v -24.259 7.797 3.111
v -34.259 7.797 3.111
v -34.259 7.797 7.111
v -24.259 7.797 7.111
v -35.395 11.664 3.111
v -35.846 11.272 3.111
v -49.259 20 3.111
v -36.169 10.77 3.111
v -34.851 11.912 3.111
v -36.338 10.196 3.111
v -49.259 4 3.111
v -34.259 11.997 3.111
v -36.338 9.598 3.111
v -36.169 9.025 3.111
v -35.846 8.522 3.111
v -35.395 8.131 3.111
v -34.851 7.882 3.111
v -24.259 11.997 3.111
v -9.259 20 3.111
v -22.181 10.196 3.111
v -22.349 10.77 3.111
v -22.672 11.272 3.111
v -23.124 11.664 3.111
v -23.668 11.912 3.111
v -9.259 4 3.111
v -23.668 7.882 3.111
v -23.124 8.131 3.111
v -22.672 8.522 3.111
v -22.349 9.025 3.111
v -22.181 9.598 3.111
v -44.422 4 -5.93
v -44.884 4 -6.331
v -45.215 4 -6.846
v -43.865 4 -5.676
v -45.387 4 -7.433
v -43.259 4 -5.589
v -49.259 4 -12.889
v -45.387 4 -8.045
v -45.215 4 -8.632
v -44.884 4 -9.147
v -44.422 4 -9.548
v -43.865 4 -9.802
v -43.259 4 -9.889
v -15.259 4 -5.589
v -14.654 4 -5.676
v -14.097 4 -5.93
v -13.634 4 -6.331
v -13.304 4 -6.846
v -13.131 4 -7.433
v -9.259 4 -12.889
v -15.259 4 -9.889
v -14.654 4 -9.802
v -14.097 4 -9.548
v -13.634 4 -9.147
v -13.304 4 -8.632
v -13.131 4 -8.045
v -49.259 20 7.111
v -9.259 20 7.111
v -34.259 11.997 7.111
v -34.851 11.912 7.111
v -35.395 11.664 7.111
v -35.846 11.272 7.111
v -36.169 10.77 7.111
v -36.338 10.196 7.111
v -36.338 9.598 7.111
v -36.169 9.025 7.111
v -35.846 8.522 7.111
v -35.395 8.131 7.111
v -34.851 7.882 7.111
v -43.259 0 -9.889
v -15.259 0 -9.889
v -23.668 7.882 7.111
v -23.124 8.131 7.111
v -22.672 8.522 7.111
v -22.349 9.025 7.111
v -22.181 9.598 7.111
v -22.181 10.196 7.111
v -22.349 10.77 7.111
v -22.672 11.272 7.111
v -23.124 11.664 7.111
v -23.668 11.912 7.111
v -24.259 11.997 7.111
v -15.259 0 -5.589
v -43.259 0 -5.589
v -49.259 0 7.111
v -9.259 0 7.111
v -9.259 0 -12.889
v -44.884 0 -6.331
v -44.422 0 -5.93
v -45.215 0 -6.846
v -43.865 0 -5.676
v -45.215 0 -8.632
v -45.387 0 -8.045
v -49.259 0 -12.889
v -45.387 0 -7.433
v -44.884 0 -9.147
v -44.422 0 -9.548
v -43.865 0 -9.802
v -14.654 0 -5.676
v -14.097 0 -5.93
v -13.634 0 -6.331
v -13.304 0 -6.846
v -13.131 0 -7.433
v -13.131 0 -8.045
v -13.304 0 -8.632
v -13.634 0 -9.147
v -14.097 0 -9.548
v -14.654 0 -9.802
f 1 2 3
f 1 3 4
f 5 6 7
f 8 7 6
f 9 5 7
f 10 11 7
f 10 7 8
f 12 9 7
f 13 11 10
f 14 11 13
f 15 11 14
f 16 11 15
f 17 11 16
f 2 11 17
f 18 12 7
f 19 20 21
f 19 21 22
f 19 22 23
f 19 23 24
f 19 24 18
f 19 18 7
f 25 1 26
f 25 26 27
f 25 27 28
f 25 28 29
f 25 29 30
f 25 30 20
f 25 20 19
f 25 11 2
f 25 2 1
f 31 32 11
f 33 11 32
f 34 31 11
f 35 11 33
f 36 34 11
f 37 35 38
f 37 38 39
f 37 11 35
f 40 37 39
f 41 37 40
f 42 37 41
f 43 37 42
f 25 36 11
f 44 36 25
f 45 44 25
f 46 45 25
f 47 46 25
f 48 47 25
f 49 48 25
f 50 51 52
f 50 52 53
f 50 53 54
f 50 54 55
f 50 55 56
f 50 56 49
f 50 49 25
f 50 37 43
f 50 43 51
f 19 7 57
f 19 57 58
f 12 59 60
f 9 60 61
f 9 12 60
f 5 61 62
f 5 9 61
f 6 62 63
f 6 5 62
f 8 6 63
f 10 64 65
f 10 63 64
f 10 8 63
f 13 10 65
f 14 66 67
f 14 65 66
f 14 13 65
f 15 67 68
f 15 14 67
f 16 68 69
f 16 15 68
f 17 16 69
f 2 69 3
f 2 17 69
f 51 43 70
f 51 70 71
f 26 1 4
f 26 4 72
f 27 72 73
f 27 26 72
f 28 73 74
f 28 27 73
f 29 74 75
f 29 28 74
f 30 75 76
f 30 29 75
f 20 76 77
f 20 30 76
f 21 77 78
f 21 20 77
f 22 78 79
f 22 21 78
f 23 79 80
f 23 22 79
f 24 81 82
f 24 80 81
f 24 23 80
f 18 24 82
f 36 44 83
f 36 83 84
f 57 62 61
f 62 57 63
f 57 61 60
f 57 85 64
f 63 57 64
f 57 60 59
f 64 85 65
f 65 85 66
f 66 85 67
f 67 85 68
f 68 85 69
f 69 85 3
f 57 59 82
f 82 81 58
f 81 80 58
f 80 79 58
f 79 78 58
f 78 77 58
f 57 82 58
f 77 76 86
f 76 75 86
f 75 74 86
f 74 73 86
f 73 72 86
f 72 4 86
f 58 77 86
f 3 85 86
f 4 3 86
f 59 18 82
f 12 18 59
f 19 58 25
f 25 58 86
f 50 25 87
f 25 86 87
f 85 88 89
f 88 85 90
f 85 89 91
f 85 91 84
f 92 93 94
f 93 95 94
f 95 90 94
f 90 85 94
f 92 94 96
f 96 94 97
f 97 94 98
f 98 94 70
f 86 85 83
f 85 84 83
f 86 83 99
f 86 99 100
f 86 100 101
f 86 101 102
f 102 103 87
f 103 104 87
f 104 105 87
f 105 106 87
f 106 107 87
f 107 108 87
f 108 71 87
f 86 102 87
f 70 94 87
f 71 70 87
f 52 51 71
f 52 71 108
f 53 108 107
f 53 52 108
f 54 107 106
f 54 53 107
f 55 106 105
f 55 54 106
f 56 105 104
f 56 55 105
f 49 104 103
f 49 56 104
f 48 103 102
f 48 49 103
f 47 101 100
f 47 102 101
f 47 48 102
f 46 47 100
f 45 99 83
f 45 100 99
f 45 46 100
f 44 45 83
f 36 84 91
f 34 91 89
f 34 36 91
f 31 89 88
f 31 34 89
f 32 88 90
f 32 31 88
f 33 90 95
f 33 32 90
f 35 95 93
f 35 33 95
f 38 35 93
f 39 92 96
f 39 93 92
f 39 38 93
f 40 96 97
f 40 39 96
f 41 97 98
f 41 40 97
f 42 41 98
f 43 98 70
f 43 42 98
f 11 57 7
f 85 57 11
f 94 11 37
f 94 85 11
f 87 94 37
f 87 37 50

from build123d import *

# Parameters (mm, degrees)
SKETCH1_W           = 40
SKETCH1_H           = 20
BOSS_EXTRUDE1_DEPTH = 4
SKETCH5_W           = 40
SKETCH5_H           = 4
BOSS_EXTRUDE2_DEPTH = 16
CUT_EXTRUDE3_DEPTH  = 10
CUT_EXTRUDE5_DEPTH  = 10


with BuildPart() as part:
    # Sketch1 → Boss-Extrude1 (new body)
    with BuildSketch(Plane(origin=(0, 0, 0), x_dir=(1, 0, 0), z_dir=(0, 1, 0))):
        with Locations((-29.259259259, 2.888888889)):
            Rectangle(SKETCH1_W, SKETCH1_H)
    extrude(amount=BOSS_EXTRUDE1_DEPTH)

    # Sketch5 → Boss-Extrude2 (add)
    with BuildSketch(Plane(origin=(0, 4, 0), x_dir=(1, 0, 0), z_dir=(0, 1, 0))):
        with Locations((-29.259259259, -5.111111111)):
            Rectangle(SKETCH5_W, SKETCH5_H)
    extrude(amount=BOSS_EXTRUDE2_DEPTH)

    # Sketch7 → Cut-Extrude3 (cut)
    with BuildSketch(Plane(origin=(0, 4, 0), x_dir=(1, 0, 0), z_dir=(0, 1, 0))):
        with BuildLine():
            Line((-15.259259259, 5.588888889), (-43.259259259, 5.588888889))
            ThreePointArc((-43.259259259, 5.588888889), (-45.409259259, 7.738888889), (-43.259259259, 9.888888889))
            Line((-43.259259259, 9.888888889), (-15.259259259, 9.888888889))
            ThreePointArc((-15.259259259, 9.888888889), (-13.109259259, 7.738888889), (-15.259259259, 5.588888889))
        make_face()
    extrude(amount=-CUT_EXTRUDE3_DEPTH, mode=Mode.SUBTRACT)

    # Sketch8 → Cut-Extrude5 (cut)
    with BuildSketch(Plane(origin=(0, 0, 3.111111111), x_dir=(-1, 0, 0), z_dir=(0, 0, -1))):
        with BuildLine():
            Line((24.259259259, 11.997218425), (34.259259259, 11.997218425))
            ThreePointArc((34.259259259, 11.997218425), (36.359259259, 9.897218425), (34.259259259, 7.797218425))
            Line((34.259259259, 7.797218425), (24.259259259, 7.797218425))
            ThreePointArc((24.259259259, 7.797218425), (22.159259259, 9.897218425), (24.259259259, 11.997218425))
        make_face()
    extrude(amount=-CUT_EXTRUDE5_DEPTH, mode=Mode.SUBTRACT)


solid = part.part
